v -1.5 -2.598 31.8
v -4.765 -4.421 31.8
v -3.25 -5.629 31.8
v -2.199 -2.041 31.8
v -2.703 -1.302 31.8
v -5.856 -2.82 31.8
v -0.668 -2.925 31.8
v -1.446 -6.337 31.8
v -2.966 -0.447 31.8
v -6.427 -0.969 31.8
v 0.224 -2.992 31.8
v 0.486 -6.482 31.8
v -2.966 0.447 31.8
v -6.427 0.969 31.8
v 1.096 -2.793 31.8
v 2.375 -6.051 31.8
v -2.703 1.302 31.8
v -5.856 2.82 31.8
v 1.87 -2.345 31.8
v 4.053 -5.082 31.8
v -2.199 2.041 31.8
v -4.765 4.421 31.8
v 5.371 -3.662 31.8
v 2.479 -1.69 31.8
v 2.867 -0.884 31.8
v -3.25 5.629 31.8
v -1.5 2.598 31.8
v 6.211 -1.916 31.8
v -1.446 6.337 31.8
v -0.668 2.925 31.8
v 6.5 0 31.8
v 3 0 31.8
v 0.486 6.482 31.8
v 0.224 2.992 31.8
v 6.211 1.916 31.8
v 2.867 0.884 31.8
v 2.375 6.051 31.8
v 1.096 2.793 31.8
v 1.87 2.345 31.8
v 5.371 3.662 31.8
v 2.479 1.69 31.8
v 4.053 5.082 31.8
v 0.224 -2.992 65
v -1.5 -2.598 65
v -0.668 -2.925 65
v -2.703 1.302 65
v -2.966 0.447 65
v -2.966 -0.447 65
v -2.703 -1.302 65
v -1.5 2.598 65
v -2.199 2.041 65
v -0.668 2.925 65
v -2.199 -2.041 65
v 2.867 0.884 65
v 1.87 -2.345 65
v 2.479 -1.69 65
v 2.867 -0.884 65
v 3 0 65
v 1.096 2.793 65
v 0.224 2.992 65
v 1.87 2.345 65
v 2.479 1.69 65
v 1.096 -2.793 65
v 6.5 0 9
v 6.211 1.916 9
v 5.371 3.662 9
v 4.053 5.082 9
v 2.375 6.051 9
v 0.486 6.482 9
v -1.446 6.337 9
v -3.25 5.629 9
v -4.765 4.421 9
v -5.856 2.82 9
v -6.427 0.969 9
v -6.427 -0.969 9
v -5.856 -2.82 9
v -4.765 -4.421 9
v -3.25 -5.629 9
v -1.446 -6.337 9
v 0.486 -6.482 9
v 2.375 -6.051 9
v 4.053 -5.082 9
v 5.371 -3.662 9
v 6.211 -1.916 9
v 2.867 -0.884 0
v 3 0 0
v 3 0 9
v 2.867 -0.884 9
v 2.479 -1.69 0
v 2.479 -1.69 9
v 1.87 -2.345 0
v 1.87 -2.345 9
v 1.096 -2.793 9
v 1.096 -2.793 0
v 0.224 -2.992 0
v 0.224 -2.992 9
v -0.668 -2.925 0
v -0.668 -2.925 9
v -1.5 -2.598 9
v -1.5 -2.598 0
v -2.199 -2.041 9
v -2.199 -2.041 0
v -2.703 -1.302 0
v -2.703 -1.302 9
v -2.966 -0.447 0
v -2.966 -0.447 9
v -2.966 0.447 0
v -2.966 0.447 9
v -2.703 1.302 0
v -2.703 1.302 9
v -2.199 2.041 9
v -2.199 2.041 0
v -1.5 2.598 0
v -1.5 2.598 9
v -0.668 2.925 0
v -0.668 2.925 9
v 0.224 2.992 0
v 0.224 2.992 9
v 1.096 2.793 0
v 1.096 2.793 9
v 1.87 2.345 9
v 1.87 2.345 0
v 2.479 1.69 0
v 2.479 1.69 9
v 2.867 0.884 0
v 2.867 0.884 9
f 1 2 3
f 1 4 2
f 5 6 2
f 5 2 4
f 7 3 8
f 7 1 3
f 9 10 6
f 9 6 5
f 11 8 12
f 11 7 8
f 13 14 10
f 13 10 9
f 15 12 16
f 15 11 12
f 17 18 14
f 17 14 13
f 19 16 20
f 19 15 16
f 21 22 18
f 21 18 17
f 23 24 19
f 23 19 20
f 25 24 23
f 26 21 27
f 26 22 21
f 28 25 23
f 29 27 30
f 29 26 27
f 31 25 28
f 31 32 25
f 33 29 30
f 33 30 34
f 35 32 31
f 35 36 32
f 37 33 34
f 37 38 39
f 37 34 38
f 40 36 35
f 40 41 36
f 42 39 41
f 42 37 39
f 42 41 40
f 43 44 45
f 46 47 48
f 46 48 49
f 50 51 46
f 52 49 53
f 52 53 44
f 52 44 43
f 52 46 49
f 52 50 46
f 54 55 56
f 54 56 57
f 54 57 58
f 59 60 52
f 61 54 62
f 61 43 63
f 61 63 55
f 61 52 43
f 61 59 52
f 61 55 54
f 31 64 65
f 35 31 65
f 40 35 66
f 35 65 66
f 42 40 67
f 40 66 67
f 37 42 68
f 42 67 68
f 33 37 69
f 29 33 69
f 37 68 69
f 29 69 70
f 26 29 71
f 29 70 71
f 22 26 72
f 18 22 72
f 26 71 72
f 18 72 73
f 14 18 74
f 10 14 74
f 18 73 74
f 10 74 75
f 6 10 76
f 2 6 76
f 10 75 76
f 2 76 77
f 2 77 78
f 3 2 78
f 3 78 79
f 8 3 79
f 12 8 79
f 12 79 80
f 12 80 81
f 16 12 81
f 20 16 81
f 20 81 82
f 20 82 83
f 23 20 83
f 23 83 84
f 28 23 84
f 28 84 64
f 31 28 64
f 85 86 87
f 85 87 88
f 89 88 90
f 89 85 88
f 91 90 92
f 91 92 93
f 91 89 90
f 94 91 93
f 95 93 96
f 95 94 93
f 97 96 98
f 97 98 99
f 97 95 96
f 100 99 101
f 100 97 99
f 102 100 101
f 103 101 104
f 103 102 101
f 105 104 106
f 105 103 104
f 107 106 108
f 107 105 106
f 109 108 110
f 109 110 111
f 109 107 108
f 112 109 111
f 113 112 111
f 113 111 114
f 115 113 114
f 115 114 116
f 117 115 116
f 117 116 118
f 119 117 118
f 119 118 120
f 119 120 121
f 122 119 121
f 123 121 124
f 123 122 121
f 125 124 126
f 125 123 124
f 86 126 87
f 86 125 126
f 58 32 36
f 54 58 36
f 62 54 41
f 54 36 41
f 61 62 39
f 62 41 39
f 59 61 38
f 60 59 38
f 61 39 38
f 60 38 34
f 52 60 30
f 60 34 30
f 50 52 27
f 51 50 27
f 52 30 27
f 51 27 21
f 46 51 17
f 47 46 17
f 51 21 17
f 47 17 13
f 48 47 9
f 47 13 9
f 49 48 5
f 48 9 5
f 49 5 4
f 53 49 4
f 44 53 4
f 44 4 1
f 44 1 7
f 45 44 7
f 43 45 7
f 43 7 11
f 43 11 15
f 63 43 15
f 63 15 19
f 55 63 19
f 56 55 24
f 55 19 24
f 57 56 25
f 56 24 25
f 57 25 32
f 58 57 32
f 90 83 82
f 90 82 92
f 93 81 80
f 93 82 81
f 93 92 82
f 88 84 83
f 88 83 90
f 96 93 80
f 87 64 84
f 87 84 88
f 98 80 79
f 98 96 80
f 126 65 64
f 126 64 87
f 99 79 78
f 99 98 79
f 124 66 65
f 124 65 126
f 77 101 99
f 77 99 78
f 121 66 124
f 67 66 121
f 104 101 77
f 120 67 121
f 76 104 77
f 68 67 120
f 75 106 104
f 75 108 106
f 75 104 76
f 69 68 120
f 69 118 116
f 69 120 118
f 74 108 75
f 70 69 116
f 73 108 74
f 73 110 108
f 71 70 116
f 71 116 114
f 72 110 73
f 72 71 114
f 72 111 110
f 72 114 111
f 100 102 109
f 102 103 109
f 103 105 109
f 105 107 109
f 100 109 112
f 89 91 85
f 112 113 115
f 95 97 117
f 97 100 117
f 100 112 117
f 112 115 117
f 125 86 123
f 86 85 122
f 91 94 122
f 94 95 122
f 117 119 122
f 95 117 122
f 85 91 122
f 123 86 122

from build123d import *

# Parameters (mm, degrees)
SKETCH1_R           = 6.5
BOSS_EXTRUDE1_DEPTH = 65
CUT_EXTRUDE2_START  = -33.2
SKETCH3_R           = 6.5
SKETCH3_R_2         = 3
CUT_EXTRUDE2_DEPTH  = 33.2
SKETCH4_R           = 6.5
SKETCH4_R_2         = 3
CUT_EXTRUDE3_DEPTH  = 9


with BuildPart() as part:
    # Sketch1 → Boss-Extrude1 (new body)
    with BuildSketch(Plane.XY):
        Circle(SKETCH1_R)
    extrude(amount=BOSS_EXTRUDE1_DEPTH)

    # Sketch3 → Cut-Extrude2 (cut)
    with BuildSketch(Plane.XY.offset(65).offset(CUT_EXTRUDE2_START)):
        Circle(SKETCH3_R)
        Circle(SKETCH3_R_2, mode=Mode.SUBTRACT)
    extrude(amount=CUT_EXTRUDE2_DEPTH, mode=Mode.SUBTRACT)

    # Sketch4 → Cut-Extrude3 (cut)
    with BuildSketch(Plane(origin=(0, 0, 0), x_dir=(-1, 0, 0), z_dir=(0, 0, -1))):
        Circle(SKETCH4_R)
        with Locations(Location((0, 0, 0), (0, 0, 180))):
            Circle(SKETCH4_R_2, mode=Mode.SUBTRACT)
    extrude(amount=-CUT_EXTRUDE3_DEPTH, mode=Mode.SUBTRACT)


solid = part.part
